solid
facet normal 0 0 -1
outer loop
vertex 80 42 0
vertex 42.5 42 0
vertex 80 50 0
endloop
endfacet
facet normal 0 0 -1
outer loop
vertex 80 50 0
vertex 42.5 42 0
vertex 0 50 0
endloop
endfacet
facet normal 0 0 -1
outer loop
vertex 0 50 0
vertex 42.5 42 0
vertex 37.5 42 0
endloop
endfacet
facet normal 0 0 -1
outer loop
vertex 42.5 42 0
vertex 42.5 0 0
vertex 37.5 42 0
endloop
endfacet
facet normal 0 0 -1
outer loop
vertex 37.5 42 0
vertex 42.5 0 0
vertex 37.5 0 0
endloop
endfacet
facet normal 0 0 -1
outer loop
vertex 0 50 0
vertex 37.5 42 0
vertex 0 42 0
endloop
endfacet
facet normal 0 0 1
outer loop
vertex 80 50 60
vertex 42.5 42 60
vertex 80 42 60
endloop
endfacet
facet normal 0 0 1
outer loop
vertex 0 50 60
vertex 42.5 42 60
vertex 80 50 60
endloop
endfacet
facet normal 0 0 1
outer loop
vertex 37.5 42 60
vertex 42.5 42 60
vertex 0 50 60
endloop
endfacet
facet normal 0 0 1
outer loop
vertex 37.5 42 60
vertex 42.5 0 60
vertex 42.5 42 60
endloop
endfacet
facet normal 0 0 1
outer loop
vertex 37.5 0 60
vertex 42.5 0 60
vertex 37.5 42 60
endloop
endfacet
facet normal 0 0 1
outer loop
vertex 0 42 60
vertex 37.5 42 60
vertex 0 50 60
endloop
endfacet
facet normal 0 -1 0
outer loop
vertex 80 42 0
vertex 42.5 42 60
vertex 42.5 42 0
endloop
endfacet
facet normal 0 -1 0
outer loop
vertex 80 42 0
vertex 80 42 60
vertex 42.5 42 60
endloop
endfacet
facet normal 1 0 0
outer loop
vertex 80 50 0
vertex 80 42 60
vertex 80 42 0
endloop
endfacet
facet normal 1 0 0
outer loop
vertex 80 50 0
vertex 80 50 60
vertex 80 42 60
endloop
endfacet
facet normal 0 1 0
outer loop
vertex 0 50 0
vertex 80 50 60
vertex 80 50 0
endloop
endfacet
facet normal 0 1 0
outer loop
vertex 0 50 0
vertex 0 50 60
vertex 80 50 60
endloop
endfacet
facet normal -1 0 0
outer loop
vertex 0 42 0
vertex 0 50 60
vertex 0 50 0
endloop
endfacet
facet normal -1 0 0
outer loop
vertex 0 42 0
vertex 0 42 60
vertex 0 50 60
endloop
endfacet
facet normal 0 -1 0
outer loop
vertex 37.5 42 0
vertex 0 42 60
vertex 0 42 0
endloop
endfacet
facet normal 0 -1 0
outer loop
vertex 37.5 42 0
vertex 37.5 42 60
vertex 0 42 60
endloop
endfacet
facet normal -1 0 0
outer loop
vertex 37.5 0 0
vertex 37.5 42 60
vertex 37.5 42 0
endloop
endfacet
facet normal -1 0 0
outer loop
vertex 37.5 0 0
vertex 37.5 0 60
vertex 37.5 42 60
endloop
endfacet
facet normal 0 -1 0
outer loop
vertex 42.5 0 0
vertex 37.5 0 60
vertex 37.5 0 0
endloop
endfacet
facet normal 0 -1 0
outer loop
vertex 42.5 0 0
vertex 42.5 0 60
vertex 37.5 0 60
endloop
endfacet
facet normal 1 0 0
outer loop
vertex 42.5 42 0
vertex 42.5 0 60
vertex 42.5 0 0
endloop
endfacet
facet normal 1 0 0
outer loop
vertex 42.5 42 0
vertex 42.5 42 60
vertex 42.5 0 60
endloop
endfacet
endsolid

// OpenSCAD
$fn = 32;

// ----------------------------------------------------------------------
// Structural section: tee 80 x 50 mm
// ----------------------------------------------------------------------

// --- parameters (mm) ---
sec_w = 80;               // tee width, X
sec_h = 50;               // tee height, Y
flange_t = 8;             // top flange thickness
web_t = 5;                // web thickness
plate_t = 60;             // cut length, Z (extrusion height)

profile = [[37.5, 0], [42.5, 0], [42.5, 42], [80, 42], [80, 50], [0, 50], [0, 42], [37.5, 42]];  // primary outline, 8 points, counter clockwise

// --- the one profile operation ---
linear_extrude(height = plate_t) polygon(points = profile);
